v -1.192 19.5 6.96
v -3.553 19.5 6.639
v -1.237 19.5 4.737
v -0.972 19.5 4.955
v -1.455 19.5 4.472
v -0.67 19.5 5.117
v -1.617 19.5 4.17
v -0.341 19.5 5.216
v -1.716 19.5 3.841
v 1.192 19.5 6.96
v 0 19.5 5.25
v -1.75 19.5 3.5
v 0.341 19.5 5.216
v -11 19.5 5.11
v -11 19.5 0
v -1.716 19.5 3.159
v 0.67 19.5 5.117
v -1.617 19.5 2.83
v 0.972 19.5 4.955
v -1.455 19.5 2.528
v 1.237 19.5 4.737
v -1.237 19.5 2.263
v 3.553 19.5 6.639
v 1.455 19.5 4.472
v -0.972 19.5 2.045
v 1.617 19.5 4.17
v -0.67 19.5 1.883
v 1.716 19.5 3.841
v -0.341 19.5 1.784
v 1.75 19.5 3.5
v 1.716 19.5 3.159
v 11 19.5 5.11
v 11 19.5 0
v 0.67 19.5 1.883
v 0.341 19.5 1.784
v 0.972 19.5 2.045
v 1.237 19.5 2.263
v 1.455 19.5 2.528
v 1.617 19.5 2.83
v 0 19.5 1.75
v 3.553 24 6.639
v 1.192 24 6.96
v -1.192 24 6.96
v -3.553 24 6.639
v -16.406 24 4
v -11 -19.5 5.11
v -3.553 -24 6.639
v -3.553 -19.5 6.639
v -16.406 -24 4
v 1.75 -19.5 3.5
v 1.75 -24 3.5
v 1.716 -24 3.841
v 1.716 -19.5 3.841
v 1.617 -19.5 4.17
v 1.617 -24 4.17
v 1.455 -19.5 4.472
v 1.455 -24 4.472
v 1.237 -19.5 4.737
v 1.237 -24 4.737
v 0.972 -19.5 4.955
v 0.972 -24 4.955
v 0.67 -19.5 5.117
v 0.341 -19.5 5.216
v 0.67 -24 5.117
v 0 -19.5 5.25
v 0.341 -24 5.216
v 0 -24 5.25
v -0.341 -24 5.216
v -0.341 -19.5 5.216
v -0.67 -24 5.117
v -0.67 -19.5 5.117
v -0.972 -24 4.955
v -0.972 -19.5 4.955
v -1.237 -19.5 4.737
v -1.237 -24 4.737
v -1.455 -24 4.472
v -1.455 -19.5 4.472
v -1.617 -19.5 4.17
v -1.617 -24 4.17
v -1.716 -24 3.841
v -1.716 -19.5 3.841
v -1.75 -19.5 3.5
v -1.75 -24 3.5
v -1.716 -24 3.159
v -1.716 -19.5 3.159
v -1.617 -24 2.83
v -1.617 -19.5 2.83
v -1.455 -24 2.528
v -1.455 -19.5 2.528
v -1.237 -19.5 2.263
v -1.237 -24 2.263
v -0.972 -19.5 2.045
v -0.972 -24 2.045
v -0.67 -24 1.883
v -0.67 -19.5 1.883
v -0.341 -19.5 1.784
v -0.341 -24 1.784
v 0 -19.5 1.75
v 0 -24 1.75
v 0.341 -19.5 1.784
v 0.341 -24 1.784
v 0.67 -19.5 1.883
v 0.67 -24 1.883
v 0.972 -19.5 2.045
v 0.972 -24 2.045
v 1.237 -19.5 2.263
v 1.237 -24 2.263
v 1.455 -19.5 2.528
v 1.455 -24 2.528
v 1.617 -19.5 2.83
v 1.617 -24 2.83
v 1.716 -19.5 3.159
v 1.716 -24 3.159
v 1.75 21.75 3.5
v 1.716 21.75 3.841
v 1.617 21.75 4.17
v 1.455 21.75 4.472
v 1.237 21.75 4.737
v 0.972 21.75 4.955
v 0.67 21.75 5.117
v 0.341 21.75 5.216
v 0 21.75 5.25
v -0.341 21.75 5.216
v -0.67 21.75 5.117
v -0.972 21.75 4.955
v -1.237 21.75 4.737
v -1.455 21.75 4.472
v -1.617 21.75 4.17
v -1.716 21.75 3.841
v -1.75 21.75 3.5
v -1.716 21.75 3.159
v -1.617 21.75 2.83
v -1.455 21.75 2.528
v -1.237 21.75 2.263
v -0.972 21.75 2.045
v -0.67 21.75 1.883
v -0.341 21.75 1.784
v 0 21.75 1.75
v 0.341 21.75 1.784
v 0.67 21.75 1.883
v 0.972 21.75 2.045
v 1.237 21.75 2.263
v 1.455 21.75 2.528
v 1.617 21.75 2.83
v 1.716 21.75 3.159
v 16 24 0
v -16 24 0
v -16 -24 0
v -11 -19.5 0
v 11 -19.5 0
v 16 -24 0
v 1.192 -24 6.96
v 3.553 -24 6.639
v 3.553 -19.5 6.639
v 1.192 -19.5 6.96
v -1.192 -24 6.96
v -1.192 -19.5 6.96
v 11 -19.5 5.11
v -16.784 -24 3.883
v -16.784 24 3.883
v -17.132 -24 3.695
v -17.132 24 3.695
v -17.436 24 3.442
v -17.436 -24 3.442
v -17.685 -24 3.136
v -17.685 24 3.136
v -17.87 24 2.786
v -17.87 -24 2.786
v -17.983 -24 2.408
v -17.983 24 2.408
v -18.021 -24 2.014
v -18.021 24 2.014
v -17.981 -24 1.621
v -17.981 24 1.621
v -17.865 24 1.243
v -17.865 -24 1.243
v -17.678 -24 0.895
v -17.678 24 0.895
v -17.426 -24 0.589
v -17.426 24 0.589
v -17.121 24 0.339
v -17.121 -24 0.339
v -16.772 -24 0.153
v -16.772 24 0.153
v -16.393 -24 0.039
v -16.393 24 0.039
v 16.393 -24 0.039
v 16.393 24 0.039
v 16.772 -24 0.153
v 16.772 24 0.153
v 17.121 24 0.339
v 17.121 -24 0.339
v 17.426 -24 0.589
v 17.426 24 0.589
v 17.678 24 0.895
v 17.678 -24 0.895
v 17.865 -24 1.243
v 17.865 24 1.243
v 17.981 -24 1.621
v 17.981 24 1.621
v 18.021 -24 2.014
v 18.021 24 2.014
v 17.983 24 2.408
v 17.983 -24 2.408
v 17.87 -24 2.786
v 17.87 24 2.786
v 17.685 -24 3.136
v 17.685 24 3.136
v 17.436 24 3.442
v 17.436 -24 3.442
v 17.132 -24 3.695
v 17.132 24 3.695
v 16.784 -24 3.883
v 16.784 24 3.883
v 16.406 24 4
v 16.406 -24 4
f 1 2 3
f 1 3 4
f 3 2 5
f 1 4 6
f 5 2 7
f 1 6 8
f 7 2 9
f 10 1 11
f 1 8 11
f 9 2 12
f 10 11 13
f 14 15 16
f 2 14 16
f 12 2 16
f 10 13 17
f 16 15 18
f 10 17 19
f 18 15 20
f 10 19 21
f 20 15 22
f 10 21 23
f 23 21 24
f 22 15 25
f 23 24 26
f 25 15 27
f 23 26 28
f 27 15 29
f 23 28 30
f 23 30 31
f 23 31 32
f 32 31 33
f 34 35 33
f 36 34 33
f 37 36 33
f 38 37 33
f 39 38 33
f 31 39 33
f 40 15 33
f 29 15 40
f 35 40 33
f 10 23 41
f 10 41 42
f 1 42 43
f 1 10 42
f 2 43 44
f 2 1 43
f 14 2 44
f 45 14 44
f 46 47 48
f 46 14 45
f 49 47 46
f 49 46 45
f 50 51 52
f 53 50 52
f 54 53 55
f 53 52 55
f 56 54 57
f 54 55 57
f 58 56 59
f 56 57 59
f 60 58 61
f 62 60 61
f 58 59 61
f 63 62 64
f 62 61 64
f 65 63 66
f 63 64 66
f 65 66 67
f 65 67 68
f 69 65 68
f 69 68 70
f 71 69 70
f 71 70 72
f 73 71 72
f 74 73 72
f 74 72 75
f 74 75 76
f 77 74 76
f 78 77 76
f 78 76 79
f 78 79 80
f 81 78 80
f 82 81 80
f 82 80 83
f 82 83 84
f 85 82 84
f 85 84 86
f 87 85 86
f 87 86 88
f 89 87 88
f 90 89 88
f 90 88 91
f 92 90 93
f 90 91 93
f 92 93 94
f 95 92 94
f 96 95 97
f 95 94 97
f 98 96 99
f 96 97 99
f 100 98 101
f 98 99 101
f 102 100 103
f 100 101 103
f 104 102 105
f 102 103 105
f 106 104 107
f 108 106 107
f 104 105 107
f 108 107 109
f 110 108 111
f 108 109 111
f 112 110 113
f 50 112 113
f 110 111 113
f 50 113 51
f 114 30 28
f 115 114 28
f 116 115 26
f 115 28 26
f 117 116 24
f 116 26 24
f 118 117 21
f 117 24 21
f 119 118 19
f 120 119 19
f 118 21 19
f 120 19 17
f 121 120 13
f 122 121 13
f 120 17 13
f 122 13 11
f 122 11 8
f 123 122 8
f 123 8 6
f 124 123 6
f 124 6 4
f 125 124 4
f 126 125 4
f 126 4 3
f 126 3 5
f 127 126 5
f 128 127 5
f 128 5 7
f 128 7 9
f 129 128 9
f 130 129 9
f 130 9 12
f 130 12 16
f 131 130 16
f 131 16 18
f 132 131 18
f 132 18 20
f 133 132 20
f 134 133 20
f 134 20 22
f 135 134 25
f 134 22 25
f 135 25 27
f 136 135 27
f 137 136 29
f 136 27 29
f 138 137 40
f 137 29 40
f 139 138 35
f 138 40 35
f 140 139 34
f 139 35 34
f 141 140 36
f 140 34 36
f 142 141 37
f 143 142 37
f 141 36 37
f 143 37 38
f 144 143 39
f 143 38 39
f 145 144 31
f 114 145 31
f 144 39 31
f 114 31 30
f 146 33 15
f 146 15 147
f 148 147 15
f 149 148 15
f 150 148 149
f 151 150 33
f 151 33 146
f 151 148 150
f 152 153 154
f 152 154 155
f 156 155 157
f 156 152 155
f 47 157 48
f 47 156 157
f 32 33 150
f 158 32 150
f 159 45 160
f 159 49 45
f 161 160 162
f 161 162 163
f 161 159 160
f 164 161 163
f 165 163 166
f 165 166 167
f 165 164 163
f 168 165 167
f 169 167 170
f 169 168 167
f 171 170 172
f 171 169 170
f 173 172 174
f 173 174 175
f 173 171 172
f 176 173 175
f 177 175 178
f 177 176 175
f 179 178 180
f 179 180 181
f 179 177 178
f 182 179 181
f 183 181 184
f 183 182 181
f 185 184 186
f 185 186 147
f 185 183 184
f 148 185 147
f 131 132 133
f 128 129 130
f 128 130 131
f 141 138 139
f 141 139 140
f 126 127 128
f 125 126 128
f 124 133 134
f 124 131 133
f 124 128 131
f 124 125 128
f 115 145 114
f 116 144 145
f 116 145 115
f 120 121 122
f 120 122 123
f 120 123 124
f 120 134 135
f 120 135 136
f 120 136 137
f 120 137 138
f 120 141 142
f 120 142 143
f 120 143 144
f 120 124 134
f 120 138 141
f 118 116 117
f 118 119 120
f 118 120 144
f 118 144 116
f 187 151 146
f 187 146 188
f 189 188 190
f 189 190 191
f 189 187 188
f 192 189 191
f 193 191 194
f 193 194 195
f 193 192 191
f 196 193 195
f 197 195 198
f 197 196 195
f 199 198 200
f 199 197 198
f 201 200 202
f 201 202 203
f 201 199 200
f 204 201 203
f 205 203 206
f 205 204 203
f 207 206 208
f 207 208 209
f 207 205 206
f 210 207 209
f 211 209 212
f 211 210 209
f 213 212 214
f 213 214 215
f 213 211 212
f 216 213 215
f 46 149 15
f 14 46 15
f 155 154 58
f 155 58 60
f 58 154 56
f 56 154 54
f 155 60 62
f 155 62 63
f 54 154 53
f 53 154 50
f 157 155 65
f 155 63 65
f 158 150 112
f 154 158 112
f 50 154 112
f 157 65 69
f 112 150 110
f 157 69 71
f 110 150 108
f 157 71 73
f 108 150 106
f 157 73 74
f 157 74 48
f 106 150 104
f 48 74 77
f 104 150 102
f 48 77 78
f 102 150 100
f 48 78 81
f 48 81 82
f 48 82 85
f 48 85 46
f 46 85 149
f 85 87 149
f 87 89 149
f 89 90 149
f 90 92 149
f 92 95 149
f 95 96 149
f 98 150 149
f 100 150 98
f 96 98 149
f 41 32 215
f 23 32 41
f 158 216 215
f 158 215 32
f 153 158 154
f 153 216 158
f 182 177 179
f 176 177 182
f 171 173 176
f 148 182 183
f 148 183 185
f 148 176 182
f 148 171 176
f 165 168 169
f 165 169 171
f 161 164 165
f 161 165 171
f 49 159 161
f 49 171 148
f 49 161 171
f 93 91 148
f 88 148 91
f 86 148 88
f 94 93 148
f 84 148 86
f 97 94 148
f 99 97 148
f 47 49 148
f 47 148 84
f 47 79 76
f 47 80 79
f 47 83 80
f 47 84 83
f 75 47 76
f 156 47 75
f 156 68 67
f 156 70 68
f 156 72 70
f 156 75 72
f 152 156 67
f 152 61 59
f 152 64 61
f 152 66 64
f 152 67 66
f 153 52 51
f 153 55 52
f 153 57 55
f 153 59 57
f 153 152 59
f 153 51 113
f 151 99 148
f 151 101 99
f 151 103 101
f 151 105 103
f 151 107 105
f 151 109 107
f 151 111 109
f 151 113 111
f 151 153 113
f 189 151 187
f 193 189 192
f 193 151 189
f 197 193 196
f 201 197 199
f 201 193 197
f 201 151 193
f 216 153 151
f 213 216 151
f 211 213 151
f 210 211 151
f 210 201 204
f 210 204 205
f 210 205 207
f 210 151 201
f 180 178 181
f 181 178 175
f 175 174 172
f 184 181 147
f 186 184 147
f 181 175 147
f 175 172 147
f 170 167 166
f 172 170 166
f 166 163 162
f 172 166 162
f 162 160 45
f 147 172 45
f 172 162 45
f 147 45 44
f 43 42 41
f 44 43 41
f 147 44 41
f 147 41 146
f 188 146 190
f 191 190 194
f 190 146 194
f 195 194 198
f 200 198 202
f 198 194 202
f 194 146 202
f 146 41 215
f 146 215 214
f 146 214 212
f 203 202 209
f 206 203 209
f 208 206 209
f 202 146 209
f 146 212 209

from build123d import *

# Parameters (mm, degrees)
F1_DEPTH = 24
F3_DEPTH = 7.001
F4_R     = 1.75
F5_DEPTH = 45.75


with BuildPart() as f1:
    # F0 (on Front) → F1 (new body, symmetric)
    with BuildSketch(Plane.XZ):
        with BuildLine():
            ThreePointArc((-16.406394, 4), (-18.010296, 1.816402), (-16, 0))
            Line((-16, 0), (16, 0))
            ThreePointArc((16, 0), (18.010296, 1.816402), (16.406394, 4))
            Line((16.406394, 4), (3.552904, 6.63903))
            ThreePointArc((3.552904, 6.63903), (0, 7), (-3.552904, 6.63903))
            Line((-3.552904, 6.63903), (-16.406394, 4))
        make_face()
    extrude(amount=F1_DEPTH, both=True)

    # F2 (on face) → F3 (cut, through all)
    with BuildSketch(Plane(origin=(0, 0, 0), x_dir=(1, 0, 0), z_dir=(0, 0, -1))):
        Polygon((-11, 19.5), (-11, -19.5), (-4, -19.5), (4, -19.5), (11, -19.5), (11, 19.5), (4, 19.5), (-4, 19.5), align=None)
    extrude(amount=-F3_DEPTH, mode=Mode.SUBTRACT)

    # F4 (on face) → F5 (cut, through all)
    with BuildSketch(Plane.XZ.offset(24)):
        with Locations((0, 3.5)):
            Circle(F4_R)
    extrude(amount=-F5_DEPTH, mode=Mode.SUBTRACT)


solid = f1.part
